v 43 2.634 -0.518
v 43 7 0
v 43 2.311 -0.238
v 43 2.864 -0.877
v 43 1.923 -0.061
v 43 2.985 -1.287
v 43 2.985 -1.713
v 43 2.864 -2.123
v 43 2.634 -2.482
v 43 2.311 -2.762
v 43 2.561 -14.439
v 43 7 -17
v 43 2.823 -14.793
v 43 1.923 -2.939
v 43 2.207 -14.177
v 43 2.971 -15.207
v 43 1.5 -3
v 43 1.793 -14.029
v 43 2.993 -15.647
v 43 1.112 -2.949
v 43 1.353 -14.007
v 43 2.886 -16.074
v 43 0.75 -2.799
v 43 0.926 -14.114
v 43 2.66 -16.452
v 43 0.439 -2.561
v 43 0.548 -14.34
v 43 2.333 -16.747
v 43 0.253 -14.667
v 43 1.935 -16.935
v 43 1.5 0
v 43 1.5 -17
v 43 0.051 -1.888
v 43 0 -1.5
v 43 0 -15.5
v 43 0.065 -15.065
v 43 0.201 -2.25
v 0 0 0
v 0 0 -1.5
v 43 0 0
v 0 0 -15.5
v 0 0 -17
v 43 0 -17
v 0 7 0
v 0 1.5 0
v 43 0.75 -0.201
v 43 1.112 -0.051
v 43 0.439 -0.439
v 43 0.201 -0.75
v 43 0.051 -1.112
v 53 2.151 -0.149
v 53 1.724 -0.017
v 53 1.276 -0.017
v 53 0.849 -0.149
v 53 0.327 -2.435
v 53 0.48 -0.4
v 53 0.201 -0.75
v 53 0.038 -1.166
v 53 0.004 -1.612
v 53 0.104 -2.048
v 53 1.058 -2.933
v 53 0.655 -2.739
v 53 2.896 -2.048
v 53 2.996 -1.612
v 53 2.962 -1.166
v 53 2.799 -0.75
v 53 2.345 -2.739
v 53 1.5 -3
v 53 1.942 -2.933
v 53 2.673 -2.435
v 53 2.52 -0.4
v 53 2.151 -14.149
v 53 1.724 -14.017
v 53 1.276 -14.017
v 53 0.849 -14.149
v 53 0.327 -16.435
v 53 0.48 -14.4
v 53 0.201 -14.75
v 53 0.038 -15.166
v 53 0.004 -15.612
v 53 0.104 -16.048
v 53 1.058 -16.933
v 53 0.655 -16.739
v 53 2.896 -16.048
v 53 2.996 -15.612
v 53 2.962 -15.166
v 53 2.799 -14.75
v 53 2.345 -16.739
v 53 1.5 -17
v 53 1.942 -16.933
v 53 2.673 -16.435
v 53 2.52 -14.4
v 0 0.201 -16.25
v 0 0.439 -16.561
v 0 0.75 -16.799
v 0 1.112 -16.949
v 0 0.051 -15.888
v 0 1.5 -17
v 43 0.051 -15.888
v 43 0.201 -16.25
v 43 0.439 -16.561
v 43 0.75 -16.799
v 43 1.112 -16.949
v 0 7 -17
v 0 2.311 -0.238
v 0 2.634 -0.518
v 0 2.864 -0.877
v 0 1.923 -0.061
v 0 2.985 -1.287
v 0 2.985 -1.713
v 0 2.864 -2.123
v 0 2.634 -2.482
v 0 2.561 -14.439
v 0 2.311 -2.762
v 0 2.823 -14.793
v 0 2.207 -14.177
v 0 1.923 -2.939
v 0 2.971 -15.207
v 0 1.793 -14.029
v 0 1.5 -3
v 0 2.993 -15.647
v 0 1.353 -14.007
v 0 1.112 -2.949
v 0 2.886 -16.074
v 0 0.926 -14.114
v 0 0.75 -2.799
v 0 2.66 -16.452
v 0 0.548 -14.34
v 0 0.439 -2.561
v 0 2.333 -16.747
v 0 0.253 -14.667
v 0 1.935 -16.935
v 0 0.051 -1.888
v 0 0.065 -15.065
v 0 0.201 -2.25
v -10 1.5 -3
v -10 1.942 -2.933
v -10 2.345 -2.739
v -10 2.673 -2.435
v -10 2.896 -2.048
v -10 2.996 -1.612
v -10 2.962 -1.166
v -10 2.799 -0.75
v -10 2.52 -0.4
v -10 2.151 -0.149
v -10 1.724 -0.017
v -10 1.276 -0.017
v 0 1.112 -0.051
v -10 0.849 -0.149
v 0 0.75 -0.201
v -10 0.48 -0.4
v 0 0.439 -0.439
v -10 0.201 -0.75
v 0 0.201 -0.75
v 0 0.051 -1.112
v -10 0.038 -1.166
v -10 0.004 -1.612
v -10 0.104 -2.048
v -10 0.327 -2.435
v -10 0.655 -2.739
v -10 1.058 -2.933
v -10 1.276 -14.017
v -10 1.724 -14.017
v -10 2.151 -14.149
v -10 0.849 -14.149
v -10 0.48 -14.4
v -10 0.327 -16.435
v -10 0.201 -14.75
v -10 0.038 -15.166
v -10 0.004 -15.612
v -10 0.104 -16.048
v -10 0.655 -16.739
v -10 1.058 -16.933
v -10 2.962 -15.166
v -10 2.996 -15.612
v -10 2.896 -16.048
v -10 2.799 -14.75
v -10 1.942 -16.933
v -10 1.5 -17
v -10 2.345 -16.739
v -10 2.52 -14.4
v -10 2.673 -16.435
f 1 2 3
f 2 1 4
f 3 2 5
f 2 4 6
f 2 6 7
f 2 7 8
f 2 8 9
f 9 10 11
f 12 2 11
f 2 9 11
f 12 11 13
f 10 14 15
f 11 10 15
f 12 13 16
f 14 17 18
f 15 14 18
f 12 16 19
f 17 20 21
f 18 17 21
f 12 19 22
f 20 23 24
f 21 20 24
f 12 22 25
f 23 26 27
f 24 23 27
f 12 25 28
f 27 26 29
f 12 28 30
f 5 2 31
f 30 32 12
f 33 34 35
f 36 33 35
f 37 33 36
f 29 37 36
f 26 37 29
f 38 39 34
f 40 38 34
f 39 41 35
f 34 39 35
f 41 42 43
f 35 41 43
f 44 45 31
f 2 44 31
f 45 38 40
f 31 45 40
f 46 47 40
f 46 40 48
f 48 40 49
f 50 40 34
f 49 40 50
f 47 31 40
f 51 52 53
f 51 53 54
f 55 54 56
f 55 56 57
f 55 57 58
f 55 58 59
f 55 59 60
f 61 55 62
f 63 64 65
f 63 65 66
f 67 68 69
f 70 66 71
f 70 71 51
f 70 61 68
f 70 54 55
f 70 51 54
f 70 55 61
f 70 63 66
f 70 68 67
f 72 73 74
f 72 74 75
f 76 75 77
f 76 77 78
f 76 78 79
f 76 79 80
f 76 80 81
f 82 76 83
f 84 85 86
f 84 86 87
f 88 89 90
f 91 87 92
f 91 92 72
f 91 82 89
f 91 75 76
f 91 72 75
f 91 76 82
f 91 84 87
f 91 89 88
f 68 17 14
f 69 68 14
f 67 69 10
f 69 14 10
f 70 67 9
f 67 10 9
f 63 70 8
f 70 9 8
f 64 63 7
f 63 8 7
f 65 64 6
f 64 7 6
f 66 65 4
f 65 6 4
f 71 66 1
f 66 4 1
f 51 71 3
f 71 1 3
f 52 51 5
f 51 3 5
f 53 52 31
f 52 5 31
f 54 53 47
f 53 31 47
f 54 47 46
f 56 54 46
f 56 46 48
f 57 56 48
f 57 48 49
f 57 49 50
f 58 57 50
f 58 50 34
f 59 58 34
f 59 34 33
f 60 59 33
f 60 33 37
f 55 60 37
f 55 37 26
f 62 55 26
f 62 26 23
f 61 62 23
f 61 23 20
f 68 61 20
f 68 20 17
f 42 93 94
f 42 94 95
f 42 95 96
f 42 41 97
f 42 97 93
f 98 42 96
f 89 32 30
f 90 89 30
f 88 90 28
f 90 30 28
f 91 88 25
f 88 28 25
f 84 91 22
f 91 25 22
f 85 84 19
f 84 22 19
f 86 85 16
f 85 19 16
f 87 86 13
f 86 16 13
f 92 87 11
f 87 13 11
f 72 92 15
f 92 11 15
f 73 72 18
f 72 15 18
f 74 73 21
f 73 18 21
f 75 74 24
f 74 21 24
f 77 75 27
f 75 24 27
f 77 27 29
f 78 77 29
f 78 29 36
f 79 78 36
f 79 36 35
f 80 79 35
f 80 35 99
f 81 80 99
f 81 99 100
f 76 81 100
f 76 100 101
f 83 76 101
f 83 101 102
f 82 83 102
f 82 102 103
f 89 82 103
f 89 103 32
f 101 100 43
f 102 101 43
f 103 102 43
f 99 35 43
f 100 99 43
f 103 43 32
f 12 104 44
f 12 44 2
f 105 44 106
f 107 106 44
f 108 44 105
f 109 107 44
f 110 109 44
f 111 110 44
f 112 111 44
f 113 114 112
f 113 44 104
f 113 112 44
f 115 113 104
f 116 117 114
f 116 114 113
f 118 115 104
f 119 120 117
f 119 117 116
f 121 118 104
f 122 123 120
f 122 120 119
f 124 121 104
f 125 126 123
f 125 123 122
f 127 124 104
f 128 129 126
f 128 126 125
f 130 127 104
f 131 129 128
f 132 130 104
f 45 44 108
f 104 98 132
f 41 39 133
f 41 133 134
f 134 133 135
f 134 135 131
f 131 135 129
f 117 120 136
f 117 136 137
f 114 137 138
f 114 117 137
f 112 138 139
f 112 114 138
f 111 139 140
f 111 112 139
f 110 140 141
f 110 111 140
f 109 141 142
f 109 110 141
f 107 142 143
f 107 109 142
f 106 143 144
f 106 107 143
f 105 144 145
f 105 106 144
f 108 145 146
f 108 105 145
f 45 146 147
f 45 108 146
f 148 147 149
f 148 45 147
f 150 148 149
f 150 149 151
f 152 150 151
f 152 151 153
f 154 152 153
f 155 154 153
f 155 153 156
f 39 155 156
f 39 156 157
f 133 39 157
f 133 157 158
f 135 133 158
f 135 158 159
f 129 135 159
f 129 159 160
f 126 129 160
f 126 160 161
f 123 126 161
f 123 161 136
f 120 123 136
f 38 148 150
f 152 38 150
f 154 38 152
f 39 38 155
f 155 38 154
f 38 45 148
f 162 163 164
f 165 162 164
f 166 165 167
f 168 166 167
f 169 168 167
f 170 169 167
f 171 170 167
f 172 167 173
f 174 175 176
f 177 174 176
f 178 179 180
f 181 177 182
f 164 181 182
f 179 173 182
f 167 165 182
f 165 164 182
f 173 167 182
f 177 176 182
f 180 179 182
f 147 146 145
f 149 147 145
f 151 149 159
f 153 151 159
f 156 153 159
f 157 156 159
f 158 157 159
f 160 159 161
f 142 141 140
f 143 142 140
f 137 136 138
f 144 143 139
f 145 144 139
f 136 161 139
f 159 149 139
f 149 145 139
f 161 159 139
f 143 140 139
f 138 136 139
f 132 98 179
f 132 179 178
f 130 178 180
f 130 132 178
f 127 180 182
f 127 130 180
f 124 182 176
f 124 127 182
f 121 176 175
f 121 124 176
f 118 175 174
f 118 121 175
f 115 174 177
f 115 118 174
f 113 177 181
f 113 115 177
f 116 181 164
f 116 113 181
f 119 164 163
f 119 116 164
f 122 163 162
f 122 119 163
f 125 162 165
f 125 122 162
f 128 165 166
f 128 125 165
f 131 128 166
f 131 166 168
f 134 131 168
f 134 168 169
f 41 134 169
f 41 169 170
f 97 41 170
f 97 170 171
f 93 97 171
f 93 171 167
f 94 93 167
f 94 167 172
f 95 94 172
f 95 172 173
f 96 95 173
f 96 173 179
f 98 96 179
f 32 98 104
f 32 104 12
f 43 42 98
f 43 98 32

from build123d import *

# Parameters (mm, degrees)
SKETCH1_W           = 43
SKETCH1_H           = 17
BOSS_EXTRUDE1_DEPTH = 7
SKETCH2_R           = 1.5
BOSS_EXTRUDE2_DEPTH = 10


with BuildPart() as part:
    # Sketch1 → Boss-Extrude1 (new body)
    with BuildSketch(Plane(origin=(0, 0, 0), x_dir=(1, 0, 0), z_dir=(0, 1, 0))):
        with Locations((21.5, 8.5)):
            Rectangle(SKETCH1_W, SKETCH1_H)
    extrude(amount=BOSS_EXTRUDE1_DEPTH)

    # Sketch2 → Boss-Extrude2 (add)
    with BuildSketch(Plane(origin=(43, 0, 0), x_dir=(0, 0, -1), z_dir=(1, 0, 0))):
        with Locations((15.5, 1.5)):
            Circle(SKETCH2_R)
        with Locations((1.5, 1.5)):
            Circle(SKETCH2_R)
    boss_extrude2 = extrude(amount=BOSS_EXTRUDE2_DEPTH)

    # Mirror1: Boss-Extrude2 across plane
    add(boss_extrude2.mirror(Plane(origin=(21.5, 0, 0), x_dir=(0, 0, 1), z_dir=(1, 0, 0))))


solid = part.part
